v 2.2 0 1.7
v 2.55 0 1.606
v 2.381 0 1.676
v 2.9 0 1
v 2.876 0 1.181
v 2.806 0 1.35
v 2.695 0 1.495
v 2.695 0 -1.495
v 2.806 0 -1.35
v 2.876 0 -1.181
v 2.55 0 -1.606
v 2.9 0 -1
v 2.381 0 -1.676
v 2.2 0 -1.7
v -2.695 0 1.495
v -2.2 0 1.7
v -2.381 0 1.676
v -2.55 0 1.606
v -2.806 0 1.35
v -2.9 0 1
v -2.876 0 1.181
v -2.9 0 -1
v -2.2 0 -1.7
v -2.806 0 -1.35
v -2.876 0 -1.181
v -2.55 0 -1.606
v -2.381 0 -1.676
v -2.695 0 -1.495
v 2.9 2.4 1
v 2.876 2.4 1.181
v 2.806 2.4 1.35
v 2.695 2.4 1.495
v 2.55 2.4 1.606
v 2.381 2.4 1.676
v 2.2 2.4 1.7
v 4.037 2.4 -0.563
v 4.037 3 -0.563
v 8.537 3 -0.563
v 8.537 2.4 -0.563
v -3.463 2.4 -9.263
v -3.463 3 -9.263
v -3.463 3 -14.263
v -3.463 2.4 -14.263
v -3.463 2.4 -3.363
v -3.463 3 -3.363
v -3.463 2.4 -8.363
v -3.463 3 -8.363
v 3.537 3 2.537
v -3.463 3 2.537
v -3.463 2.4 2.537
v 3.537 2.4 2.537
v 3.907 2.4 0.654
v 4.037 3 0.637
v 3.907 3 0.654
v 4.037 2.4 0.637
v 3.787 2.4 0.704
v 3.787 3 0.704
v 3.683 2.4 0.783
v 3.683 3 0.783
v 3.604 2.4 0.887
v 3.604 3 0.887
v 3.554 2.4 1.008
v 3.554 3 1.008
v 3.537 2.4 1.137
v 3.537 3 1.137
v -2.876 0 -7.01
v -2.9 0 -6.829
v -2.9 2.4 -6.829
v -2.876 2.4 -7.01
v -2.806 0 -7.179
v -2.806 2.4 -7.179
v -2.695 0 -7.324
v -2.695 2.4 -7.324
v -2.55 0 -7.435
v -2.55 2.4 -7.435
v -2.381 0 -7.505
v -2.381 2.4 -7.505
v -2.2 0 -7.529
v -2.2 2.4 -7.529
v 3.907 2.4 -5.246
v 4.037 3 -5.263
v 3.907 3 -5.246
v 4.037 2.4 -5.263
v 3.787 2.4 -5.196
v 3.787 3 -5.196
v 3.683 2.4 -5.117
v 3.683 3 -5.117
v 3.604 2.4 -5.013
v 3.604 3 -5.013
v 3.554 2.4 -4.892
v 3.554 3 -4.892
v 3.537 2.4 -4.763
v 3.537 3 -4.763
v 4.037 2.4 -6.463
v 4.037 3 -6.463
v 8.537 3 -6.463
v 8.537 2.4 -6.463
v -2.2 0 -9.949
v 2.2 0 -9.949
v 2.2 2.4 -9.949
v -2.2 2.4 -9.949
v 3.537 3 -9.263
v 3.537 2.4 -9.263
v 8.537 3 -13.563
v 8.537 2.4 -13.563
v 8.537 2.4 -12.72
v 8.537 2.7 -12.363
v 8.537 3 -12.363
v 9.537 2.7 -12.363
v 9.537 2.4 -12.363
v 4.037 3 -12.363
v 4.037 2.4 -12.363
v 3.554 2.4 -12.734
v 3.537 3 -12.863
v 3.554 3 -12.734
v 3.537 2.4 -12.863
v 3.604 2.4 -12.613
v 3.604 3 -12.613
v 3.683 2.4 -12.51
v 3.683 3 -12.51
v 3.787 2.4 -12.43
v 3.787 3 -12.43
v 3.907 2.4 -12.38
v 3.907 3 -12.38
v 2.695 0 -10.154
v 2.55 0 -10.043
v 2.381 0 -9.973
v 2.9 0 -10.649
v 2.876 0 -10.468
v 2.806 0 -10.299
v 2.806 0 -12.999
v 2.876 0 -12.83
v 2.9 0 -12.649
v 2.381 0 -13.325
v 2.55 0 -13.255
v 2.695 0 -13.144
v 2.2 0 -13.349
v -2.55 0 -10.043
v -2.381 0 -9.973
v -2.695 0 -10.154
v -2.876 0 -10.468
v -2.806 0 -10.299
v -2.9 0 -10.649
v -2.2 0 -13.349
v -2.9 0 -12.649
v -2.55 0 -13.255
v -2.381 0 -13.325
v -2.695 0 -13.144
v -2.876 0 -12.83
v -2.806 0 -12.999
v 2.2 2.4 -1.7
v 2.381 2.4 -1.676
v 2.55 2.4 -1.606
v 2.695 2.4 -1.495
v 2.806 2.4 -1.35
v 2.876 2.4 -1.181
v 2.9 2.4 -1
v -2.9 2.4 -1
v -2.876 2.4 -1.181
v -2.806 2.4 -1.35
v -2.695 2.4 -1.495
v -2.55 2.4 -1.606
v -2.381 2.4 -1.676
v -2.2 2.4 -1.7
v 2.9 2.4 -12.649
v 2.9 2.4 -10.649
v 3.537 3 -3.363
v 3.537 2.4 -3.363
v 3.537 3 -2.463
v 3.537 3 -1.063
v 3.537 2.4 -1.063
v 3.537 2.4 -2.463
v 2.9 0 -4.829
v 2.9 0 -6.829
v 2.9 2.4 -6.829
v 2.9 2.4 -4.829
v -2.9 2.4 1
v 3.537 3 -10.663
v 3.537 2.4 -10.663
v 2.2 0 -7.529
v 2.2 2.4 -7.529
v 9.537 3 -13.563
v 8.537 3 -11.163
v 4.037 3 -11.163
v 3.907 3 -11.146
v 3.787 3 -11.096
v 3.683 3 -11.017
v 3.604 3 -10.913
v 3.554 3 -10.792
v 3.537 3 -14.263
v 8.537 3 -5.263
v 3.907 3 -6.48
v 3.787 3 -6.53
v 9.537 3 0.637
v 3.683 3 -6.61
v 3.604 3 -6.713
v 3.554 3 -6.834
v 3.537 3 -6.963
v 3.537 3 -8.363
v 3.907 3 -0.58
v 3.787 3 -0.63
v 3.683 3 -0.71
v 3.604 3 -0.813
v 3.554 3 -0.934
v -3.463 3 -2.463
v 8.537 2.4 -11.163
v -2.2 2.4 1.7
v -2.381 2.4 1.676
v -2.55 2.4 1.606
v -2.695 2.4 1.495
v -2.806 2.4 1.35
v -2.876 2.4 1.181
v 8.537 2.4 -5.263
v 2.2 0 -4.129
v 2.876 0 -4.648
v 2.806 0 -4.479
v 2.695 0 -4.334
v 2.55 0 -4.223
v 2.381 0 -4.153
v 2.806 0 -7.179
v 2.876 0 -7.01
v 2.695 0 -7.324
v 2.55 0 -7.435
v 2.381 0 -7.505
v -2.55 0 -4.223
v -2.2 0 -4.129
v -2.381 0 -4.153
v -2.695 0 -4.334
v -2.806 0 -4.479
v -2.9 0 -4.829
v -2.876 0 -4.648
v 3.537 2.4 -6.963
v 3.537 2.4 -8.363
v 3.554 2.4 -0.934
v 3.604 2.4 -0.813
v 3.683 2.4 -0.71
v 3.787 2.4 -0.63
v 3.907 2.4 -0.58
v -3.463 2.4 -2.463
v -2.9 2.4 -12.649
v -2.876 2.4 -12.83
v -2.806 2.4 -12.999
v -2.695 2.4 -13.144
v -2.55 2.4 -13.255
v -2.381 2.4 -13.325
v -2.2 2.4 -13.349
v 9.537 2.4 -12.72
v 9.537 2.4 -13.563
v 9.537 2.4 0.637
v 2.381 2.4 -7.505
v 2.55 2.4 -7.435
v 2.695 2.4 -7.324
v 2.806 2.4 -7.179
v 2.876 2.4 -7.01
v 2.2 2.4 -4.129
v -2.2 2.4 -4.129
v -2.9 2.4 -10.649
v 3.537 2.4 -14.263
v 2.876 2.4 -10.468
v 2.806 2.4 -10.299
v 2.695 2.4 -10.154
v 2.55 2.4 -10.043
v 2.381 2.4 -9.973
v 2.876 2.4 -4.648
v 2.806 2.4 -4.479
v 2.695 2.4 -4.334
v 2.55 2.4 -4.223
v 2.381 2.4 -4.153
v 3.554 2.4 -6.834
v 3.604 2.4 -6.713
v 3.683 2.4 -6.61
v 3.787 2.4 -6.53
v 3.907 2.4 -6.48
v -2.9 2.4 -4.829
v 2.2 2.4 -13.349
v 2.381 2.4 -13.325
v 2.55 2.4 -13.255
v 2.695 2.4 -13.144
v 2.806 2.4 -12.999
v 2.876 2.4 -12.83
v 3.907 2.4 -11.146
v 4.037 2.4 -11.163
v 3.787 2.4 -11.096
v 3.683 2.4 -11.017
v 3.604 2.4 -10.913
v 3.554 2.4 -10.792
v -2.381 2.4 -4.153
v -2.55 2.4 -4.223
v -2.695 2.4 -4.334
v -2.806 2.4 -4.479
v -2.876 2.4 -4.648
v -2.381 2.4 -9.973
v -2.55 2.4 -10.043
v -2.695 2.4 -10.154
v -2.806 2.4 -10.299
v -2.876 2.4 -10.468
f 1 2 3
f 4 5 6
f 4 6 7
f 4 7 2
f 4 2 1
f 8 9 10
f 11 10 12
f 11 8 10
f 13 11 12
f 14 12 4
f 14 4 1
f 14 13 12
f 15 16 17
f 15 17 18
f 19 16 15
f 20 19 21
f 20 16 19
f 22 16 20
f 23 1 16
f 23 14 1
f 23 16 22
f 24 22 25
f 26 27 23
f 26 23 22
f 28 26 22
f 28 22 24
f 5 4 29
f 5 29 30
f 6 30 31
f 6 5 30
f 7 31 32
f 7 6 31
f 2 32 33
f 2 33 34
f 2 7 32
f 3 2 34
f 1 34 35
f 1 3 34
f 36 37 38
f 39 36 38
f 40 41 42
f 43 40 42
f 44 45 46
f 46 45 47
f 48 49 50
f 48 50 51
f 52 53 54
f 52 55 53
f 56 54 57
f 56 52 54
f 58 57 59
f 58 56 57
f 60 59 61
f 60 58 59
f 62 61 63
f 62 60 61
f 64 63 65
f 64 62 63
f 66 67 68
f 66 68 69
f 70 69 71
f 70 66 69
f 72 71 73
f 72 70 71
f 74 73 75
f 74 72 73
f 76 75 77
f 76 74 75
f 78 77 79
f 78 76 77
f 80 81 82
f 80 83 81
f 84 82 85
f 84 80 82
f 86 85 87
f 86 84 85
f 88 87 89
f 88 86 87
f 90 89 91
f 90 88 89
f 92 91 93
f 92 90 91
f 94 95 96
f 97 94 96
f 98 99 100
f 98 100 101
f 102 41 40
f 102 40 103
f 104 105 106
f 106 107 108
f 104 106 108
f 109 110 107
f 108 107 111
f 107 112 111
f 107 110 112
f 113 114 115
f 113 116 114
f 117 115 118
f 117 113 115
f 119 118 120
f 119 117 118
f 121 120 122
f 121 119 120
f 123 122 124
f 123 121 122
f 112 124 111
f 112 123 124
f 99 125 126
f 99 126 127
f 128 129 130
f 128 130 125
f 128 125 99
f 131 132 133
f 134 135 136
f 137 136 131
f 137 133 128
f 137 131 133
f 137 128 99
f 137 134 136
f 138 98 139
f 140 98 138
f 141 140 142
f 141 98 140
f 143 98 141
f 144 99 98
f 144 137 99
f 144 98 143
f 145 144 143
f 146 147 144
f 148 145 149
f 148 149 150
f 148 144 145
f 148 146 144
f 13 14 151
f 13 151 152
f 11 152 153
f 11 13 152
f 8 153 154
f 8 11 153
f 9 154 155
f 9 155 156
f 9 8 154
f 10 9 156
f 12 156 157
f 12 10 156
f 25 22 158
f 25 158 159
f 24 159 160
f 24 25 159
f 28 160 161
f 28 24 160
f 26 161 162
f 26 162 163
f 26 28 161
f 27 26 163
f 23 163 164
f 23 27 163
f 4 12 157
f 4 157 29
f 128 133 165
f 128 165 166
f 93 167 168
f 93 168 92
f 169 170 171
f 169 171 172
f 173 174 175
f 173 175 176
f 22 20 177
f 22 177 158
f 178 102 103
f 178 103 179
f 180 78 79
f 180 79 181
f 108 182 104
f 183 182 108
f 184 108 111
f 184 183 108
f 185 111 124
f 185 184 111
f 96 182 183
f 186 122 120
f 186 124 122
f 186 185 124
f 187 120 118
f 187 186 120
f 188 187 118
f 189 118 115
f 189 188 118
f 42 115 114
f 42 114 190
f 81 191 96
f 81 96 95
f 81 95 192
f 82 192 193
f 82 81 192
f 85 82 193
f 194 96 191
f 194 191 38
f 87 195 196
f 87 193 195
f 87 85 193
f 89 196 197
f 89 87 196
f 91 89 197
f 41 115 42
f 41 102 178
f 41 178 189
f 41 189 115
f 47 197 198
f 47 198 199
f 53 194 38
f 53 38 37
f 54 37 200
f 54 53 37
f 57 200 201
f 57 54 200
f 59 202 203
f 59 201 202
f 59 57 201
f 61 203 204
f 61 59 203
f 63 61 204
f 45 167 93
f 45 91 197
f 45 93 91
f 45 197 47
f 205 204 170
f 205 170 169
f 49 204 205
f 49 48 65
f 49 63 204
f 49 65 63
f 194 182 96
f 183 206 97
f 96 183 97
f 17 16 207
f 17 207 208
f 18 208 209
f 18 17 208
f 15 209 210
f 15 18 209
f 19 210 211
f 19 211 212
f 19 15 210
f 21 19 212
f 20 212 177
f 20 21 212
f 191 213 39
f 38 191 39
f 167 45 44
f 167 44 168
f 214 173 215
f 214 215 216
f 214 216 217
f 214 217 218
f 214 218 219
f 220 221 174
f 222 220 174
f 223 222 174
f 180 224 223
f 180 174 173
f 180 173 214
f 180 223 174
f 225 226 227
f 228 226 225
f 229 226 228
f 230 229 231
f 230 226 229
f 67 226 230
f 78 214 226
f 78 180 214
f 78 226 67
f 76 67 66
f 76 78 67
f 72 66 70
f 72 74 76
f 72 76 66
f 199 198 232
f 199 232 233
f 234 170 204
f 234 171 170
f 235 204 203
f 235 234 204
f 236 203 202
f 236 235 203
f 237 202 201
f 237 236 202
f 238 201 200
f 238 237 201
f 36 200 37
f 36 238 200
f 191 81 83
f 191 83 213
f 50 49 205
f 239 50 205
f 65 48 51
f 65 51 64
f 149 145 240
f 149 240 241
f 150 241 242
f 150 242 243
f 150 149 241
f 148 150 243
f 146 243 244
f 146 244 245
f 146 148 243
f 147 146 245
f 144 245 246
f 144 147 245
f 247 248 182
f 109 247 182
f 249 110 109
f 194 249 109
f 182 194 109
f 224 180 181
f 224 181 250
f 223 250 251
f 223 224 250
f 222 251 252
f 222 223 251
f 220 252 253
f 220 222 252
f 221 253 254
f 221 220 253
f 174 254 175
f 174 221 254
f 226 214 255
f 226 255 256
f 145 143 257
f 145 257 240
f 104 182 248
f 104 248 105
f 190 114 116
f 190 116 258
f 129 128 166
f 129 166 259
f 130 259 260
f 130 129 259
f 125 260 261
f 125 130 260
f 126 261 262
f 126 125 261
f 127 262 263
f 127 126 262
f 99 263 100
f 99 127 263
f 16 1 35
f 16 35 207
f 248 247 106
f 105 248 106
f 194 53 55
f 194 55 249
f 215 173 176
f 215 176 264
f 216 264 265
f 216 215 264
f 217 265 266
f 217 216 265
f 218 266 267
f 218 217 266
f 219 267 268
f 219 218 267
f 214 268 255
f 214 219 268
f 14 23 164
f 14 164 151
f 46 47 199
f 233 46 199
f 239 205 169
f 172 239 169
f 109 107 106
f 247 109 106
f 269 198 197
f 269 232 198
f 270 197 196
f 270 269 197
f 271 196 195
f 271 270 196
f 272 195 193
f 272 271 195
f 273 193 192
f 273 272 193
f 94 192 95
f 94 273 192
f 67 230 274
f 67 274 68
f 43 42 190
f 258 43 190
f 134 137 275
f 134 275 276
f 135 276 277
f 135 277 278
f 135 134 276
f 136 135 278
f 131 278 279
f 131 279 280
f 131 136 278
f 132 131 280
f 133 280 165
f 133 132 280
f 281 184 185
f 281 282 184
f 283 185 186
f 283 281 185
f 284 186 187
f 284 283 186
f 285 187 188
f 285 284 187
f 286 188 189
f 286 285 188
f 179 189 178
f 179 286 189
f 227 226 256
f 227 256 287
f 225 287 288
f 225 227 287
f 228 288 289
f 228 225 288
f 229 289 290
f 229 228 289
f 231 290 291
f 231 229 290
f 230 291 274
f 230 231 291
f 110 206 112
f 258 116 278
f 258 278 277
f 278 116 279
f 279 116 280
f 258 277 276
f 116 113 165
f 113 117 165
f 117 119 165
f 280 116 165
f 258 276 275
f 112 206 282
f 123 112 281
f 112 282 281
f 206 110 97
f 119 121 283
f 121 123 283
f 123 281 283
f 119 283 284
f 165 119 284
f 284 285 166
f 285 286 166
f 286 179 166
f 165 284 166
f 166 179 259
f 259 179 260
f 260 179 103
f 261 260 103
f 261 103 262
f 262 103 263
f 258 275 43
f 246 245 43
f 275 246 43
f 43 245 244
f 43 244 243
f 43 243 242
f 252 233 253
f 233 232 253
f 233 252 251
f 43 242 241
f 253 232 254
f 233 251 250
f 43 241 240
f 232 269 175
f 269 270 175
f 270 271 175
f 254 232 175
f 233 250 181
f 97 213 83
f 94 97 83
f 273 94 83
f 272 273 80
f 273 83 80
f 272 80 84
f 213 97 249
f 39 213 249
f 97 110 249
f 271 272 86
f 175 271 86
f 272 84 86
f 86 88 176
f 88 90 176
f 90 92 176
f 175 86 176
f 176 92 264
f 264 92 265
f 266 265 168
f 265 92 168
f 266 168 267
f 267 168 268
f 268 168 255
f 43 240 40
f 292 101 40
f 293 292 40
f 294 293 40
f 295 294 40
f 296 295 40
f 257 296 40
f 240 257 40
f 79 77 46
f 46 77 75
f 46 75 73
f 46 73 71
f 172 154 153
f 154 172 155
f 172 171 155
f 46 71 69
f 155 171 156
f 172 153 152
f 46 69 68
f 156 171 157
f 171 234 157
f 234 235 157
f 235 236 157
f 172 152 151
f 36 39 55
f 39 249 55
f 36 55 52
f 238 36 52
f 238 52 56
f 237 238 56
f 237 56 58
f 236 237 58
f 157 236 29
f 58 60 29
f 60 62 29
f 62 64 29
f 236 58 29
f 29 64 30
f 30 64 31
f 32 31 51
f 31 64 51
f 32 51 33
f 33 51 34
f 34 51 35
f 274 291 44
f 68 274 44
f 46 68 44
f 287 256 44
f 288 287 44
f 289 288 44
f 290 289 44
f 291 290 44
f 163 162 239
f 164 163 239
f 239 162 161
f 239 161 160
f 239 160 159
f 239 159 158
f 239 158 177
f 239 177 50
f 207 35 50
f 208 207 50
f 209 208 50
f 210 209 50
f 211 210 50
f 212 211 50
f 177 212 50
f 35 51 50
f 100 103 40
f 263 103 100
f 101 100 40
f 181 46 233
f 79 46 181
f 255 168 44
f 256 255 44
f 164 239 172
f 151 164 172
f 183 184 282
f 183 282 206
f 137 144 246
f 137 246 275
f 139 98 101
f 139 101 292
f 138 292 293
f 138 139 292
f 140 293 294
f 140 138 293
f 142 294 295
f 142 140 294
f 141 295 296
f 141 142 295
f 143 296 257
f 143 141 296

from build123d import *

# Parameters (mm, degrees)
EXTRUDE_1_DEPTH     = 3
EXTRUDE_1_2_DEPTH   = 3
EXTRUDE_1_3_DEPTH   = 3
SKETCH_2_W          = 7
SKETCH_2_H          = 5
EXTRUDE_2_DEPTH     = 0.6
SKETCH_3_W          = 6
SKETCH_3_H          = 1.2
EXTRUDE_3_DEPTH     = 0.6
SKETCH_4_W          = 1
SKETCH_4_H          = 13
EXTRUDE_4_DEPTH     = 0.6
FILLET_1_R          = 0.5
SKETCH_5_W          = 1
SKETCH_5_H          = 0.6
EXTRUDE_5_DEPTH     = 1.2
CUT_EXTRUDE_1_DEPTH = 1


with BuildPart() as part:
    # 草图1 → 凸台-拉伸1 (new body)
    with BuildSketch(Plane(origin=(0, 0, 0), x_dir=(1, 0, 0), z_dir=(0, 1, 0))):
        with BuildLine():
            Line((-2.2, 1.7), (2.2, 1.7))
            ThreePointArc((2.2, 1.7), (2.694974747, 1.494974747), (2.9, 1))
            Line((2.9, 1), (2.9, -1))
            ThreePointArc((2.9, -1), (2.694974747, -1.494974747), (2.2, -1.7))
            Line((2.2, -1.7), (-2.2, -1.7))
            ThreePointArc((-2.2, -1.7), (-2.694974747, -1.494974747), (-2.9, -1))
            Line((-2.9, -1), (-2.9, 1))
            ThreePointArc((-2.9, 1), (-2.694974747, 1.494974747), (-2.2, 1.7))
        make_face()
    extrude(amount=EXTRUDE_1_DEPTH)



with BuildPart() as body_2:
    # 草图1 → Extrude 1 2 (new body)
    with BuildSketch(Plane(origin=(0, 0, 0), x_dir=(1, 0, 0), z_dir=(0, 1, 0))):
        with BuildLine():
            Line((-2.2, 7.528722779), (2.2, 7.528722779))
            ThreePointArc((2.2, 7.528722779), (2.694974747, 7.323697526), (2.9, 6.828722779))
            Line((2.9, 6.828722779), (2.9, 4.828722779))
            ThreePointArc((2.9, 4.828722779), (2.694974747, 4.333748032), (2.2, 4.128722779))
            Line((2.2, 4.128722779), (-2.2, 4.128722779))
            ThreePointArc((-2.2, 4.128722779), (-2.694974747, 4.333748032), (-2.9, 4.828722779))
            Line((-2.9, 4.828722779), (-2.9, 6.828722779))
            ThreePointArc((-2.9, 6.828722779), (-2.694974747, 7.323697526), (-2.2, 7.528722779))
        make_face()
    extrude(amount=EXTRUDE_1_2_DEPTH)


with BuildPart() as body_3:
    # 草图1 → Extrude 1 3 (new body)
    with BuildSketch(Plane(origin=(0, 0, 0), x_dir=(1, 0, 0), z_dir=(0, 1, 0))):
        with BuildLine():
            Line((-2.2, 13.349128593), (2.2, 13.349128593))
            ThreePointArc((2.2, 13.349128593), (2.694974747, 13.144103339), (2.9, 12.649128593))
            Line((2.9, 12.649128593), (2.9, 10.649128593))
            ThreePointArc((2.9, 10.649128593), (2.694974747, 10.154153846), (2.2, 9.949128593))
            Line((2.2, 9.949128593), (-2.2, 9.949128593))
            ThreePointArc((-2.2, 9.949128593), (-2.694974747, 10.154153846), (-2.9, 10.649128593))
            Line((-2.9, 10.649128593), (-2.9, 12.649128593))
            ThreePointArc((-2.9, 12.649128593), (-2.694974747, 13.144103339), (-2.2, 13.349128593))
        make_face()
    extrude(amount=EXTRUDE_1_3_DEPTH)


with BuildPart() as part_1:
    add(part.part)

    add(body_2.part)  # 凸台-拉伸2 merges body 2

    add(body_3.part)  # 凸台-拉伸2 merges body 3
    # 草图2 → 凸台-拉伸2 (add)
    with BuildSketch(Plane(origin=(0, 3, 0), x_dir=(1, 0, 0), z_dir=(0, 1, 0))):
        with Locations((0.036699987, 11.763062551)):
            Rectangle(SKETCH_2_W, SKETCH_2_H)
        with Locations((0.036699987, 5.863062551)):
            Rectangle(SKETCH_2_W, SKETCH_2_H)
        with Locations((0.036699987, -0.036937449)):
            Rectangle(SKETCH_2_W, SKETCH_2_H)
    extrude(amount=-EXTRUDE_2_DEPTH)

    # 草图3 → 凸台-拉伸3 (add)
    with BuildSketch(Plane(origin=(0, 3, 0), x_dir=(1, 0, 0), z_dir=(0, 1, 0))):
        with Locations((6.536699987, 11.763062551)):
            Rectangle(SKETCH_3_W, SKETCH_3_H)
        with Locations((6.536699987, 5.863062551)):
            Rectangle(SKETCH_3_W, SKETCH_3_H)
        with Locations((6.536699987, -0.036937449)):
            Rectangle(SKETCH_3_W, SKETCH_3_H)
    extrude(amount=-EXTRUDE_3_DEPTH)

    # 草图4 → 凸台-拉伸4 (add)
    with BuildSketch(Plane.XZ.offset(-2.4)):
        with Locations((9.036699987, -5.863062551)):
            Rectangle(SKETCH_4_W, SKETCH_4_H)
    extrude(amount=-EXTRUDE_4_DEPTH)

    # 圆角1
    fillet_1_edges = [part_1.edges().sort_by_distance(p)[0] for p in [
        (3.536699987, 2.7, -11.163062551),
        (3.536699987, 2.7, -12.363062551),
        (3.536699987, 2.7, 0.636937449),
        (3.536699987, 2.7, -0.563062551),
        (3.536699987, 2.7, -5.263062551),
        (3.536699987, 2.7, -6.463062551),
    ]]
    fillet(fillet_1_edges, radius=FILLET_1_R)

    # 草图5 → 凸台-拉伸5 (add)
    with BuildSketch(Plane(origin=(0, 0, -12.363062551), x_dir=(-1, 0, 0), z_dir=(0, 0, -1))):
        with Locations((-9.036699987, 2.7)):
            Rectangle(SKETCH_5_W, SKETCH_5_H)
    extrude(amount=EXTRUDE_5_DEPTH)

    # 草图6 → 切除-拉伸1 (cut)
    with BuildSketch(Plane.ZY.offset(-8.536699987)):
        Polygon((-12.363062551, 2.4), (-12.363062551, 2.7), (-12.720178884, 2.4), align=None)
    extrude(amount=-CUT_EXTRUDE_1_DEPTH, mode=Mode.SUBTRACT)


solid = part_1.part
